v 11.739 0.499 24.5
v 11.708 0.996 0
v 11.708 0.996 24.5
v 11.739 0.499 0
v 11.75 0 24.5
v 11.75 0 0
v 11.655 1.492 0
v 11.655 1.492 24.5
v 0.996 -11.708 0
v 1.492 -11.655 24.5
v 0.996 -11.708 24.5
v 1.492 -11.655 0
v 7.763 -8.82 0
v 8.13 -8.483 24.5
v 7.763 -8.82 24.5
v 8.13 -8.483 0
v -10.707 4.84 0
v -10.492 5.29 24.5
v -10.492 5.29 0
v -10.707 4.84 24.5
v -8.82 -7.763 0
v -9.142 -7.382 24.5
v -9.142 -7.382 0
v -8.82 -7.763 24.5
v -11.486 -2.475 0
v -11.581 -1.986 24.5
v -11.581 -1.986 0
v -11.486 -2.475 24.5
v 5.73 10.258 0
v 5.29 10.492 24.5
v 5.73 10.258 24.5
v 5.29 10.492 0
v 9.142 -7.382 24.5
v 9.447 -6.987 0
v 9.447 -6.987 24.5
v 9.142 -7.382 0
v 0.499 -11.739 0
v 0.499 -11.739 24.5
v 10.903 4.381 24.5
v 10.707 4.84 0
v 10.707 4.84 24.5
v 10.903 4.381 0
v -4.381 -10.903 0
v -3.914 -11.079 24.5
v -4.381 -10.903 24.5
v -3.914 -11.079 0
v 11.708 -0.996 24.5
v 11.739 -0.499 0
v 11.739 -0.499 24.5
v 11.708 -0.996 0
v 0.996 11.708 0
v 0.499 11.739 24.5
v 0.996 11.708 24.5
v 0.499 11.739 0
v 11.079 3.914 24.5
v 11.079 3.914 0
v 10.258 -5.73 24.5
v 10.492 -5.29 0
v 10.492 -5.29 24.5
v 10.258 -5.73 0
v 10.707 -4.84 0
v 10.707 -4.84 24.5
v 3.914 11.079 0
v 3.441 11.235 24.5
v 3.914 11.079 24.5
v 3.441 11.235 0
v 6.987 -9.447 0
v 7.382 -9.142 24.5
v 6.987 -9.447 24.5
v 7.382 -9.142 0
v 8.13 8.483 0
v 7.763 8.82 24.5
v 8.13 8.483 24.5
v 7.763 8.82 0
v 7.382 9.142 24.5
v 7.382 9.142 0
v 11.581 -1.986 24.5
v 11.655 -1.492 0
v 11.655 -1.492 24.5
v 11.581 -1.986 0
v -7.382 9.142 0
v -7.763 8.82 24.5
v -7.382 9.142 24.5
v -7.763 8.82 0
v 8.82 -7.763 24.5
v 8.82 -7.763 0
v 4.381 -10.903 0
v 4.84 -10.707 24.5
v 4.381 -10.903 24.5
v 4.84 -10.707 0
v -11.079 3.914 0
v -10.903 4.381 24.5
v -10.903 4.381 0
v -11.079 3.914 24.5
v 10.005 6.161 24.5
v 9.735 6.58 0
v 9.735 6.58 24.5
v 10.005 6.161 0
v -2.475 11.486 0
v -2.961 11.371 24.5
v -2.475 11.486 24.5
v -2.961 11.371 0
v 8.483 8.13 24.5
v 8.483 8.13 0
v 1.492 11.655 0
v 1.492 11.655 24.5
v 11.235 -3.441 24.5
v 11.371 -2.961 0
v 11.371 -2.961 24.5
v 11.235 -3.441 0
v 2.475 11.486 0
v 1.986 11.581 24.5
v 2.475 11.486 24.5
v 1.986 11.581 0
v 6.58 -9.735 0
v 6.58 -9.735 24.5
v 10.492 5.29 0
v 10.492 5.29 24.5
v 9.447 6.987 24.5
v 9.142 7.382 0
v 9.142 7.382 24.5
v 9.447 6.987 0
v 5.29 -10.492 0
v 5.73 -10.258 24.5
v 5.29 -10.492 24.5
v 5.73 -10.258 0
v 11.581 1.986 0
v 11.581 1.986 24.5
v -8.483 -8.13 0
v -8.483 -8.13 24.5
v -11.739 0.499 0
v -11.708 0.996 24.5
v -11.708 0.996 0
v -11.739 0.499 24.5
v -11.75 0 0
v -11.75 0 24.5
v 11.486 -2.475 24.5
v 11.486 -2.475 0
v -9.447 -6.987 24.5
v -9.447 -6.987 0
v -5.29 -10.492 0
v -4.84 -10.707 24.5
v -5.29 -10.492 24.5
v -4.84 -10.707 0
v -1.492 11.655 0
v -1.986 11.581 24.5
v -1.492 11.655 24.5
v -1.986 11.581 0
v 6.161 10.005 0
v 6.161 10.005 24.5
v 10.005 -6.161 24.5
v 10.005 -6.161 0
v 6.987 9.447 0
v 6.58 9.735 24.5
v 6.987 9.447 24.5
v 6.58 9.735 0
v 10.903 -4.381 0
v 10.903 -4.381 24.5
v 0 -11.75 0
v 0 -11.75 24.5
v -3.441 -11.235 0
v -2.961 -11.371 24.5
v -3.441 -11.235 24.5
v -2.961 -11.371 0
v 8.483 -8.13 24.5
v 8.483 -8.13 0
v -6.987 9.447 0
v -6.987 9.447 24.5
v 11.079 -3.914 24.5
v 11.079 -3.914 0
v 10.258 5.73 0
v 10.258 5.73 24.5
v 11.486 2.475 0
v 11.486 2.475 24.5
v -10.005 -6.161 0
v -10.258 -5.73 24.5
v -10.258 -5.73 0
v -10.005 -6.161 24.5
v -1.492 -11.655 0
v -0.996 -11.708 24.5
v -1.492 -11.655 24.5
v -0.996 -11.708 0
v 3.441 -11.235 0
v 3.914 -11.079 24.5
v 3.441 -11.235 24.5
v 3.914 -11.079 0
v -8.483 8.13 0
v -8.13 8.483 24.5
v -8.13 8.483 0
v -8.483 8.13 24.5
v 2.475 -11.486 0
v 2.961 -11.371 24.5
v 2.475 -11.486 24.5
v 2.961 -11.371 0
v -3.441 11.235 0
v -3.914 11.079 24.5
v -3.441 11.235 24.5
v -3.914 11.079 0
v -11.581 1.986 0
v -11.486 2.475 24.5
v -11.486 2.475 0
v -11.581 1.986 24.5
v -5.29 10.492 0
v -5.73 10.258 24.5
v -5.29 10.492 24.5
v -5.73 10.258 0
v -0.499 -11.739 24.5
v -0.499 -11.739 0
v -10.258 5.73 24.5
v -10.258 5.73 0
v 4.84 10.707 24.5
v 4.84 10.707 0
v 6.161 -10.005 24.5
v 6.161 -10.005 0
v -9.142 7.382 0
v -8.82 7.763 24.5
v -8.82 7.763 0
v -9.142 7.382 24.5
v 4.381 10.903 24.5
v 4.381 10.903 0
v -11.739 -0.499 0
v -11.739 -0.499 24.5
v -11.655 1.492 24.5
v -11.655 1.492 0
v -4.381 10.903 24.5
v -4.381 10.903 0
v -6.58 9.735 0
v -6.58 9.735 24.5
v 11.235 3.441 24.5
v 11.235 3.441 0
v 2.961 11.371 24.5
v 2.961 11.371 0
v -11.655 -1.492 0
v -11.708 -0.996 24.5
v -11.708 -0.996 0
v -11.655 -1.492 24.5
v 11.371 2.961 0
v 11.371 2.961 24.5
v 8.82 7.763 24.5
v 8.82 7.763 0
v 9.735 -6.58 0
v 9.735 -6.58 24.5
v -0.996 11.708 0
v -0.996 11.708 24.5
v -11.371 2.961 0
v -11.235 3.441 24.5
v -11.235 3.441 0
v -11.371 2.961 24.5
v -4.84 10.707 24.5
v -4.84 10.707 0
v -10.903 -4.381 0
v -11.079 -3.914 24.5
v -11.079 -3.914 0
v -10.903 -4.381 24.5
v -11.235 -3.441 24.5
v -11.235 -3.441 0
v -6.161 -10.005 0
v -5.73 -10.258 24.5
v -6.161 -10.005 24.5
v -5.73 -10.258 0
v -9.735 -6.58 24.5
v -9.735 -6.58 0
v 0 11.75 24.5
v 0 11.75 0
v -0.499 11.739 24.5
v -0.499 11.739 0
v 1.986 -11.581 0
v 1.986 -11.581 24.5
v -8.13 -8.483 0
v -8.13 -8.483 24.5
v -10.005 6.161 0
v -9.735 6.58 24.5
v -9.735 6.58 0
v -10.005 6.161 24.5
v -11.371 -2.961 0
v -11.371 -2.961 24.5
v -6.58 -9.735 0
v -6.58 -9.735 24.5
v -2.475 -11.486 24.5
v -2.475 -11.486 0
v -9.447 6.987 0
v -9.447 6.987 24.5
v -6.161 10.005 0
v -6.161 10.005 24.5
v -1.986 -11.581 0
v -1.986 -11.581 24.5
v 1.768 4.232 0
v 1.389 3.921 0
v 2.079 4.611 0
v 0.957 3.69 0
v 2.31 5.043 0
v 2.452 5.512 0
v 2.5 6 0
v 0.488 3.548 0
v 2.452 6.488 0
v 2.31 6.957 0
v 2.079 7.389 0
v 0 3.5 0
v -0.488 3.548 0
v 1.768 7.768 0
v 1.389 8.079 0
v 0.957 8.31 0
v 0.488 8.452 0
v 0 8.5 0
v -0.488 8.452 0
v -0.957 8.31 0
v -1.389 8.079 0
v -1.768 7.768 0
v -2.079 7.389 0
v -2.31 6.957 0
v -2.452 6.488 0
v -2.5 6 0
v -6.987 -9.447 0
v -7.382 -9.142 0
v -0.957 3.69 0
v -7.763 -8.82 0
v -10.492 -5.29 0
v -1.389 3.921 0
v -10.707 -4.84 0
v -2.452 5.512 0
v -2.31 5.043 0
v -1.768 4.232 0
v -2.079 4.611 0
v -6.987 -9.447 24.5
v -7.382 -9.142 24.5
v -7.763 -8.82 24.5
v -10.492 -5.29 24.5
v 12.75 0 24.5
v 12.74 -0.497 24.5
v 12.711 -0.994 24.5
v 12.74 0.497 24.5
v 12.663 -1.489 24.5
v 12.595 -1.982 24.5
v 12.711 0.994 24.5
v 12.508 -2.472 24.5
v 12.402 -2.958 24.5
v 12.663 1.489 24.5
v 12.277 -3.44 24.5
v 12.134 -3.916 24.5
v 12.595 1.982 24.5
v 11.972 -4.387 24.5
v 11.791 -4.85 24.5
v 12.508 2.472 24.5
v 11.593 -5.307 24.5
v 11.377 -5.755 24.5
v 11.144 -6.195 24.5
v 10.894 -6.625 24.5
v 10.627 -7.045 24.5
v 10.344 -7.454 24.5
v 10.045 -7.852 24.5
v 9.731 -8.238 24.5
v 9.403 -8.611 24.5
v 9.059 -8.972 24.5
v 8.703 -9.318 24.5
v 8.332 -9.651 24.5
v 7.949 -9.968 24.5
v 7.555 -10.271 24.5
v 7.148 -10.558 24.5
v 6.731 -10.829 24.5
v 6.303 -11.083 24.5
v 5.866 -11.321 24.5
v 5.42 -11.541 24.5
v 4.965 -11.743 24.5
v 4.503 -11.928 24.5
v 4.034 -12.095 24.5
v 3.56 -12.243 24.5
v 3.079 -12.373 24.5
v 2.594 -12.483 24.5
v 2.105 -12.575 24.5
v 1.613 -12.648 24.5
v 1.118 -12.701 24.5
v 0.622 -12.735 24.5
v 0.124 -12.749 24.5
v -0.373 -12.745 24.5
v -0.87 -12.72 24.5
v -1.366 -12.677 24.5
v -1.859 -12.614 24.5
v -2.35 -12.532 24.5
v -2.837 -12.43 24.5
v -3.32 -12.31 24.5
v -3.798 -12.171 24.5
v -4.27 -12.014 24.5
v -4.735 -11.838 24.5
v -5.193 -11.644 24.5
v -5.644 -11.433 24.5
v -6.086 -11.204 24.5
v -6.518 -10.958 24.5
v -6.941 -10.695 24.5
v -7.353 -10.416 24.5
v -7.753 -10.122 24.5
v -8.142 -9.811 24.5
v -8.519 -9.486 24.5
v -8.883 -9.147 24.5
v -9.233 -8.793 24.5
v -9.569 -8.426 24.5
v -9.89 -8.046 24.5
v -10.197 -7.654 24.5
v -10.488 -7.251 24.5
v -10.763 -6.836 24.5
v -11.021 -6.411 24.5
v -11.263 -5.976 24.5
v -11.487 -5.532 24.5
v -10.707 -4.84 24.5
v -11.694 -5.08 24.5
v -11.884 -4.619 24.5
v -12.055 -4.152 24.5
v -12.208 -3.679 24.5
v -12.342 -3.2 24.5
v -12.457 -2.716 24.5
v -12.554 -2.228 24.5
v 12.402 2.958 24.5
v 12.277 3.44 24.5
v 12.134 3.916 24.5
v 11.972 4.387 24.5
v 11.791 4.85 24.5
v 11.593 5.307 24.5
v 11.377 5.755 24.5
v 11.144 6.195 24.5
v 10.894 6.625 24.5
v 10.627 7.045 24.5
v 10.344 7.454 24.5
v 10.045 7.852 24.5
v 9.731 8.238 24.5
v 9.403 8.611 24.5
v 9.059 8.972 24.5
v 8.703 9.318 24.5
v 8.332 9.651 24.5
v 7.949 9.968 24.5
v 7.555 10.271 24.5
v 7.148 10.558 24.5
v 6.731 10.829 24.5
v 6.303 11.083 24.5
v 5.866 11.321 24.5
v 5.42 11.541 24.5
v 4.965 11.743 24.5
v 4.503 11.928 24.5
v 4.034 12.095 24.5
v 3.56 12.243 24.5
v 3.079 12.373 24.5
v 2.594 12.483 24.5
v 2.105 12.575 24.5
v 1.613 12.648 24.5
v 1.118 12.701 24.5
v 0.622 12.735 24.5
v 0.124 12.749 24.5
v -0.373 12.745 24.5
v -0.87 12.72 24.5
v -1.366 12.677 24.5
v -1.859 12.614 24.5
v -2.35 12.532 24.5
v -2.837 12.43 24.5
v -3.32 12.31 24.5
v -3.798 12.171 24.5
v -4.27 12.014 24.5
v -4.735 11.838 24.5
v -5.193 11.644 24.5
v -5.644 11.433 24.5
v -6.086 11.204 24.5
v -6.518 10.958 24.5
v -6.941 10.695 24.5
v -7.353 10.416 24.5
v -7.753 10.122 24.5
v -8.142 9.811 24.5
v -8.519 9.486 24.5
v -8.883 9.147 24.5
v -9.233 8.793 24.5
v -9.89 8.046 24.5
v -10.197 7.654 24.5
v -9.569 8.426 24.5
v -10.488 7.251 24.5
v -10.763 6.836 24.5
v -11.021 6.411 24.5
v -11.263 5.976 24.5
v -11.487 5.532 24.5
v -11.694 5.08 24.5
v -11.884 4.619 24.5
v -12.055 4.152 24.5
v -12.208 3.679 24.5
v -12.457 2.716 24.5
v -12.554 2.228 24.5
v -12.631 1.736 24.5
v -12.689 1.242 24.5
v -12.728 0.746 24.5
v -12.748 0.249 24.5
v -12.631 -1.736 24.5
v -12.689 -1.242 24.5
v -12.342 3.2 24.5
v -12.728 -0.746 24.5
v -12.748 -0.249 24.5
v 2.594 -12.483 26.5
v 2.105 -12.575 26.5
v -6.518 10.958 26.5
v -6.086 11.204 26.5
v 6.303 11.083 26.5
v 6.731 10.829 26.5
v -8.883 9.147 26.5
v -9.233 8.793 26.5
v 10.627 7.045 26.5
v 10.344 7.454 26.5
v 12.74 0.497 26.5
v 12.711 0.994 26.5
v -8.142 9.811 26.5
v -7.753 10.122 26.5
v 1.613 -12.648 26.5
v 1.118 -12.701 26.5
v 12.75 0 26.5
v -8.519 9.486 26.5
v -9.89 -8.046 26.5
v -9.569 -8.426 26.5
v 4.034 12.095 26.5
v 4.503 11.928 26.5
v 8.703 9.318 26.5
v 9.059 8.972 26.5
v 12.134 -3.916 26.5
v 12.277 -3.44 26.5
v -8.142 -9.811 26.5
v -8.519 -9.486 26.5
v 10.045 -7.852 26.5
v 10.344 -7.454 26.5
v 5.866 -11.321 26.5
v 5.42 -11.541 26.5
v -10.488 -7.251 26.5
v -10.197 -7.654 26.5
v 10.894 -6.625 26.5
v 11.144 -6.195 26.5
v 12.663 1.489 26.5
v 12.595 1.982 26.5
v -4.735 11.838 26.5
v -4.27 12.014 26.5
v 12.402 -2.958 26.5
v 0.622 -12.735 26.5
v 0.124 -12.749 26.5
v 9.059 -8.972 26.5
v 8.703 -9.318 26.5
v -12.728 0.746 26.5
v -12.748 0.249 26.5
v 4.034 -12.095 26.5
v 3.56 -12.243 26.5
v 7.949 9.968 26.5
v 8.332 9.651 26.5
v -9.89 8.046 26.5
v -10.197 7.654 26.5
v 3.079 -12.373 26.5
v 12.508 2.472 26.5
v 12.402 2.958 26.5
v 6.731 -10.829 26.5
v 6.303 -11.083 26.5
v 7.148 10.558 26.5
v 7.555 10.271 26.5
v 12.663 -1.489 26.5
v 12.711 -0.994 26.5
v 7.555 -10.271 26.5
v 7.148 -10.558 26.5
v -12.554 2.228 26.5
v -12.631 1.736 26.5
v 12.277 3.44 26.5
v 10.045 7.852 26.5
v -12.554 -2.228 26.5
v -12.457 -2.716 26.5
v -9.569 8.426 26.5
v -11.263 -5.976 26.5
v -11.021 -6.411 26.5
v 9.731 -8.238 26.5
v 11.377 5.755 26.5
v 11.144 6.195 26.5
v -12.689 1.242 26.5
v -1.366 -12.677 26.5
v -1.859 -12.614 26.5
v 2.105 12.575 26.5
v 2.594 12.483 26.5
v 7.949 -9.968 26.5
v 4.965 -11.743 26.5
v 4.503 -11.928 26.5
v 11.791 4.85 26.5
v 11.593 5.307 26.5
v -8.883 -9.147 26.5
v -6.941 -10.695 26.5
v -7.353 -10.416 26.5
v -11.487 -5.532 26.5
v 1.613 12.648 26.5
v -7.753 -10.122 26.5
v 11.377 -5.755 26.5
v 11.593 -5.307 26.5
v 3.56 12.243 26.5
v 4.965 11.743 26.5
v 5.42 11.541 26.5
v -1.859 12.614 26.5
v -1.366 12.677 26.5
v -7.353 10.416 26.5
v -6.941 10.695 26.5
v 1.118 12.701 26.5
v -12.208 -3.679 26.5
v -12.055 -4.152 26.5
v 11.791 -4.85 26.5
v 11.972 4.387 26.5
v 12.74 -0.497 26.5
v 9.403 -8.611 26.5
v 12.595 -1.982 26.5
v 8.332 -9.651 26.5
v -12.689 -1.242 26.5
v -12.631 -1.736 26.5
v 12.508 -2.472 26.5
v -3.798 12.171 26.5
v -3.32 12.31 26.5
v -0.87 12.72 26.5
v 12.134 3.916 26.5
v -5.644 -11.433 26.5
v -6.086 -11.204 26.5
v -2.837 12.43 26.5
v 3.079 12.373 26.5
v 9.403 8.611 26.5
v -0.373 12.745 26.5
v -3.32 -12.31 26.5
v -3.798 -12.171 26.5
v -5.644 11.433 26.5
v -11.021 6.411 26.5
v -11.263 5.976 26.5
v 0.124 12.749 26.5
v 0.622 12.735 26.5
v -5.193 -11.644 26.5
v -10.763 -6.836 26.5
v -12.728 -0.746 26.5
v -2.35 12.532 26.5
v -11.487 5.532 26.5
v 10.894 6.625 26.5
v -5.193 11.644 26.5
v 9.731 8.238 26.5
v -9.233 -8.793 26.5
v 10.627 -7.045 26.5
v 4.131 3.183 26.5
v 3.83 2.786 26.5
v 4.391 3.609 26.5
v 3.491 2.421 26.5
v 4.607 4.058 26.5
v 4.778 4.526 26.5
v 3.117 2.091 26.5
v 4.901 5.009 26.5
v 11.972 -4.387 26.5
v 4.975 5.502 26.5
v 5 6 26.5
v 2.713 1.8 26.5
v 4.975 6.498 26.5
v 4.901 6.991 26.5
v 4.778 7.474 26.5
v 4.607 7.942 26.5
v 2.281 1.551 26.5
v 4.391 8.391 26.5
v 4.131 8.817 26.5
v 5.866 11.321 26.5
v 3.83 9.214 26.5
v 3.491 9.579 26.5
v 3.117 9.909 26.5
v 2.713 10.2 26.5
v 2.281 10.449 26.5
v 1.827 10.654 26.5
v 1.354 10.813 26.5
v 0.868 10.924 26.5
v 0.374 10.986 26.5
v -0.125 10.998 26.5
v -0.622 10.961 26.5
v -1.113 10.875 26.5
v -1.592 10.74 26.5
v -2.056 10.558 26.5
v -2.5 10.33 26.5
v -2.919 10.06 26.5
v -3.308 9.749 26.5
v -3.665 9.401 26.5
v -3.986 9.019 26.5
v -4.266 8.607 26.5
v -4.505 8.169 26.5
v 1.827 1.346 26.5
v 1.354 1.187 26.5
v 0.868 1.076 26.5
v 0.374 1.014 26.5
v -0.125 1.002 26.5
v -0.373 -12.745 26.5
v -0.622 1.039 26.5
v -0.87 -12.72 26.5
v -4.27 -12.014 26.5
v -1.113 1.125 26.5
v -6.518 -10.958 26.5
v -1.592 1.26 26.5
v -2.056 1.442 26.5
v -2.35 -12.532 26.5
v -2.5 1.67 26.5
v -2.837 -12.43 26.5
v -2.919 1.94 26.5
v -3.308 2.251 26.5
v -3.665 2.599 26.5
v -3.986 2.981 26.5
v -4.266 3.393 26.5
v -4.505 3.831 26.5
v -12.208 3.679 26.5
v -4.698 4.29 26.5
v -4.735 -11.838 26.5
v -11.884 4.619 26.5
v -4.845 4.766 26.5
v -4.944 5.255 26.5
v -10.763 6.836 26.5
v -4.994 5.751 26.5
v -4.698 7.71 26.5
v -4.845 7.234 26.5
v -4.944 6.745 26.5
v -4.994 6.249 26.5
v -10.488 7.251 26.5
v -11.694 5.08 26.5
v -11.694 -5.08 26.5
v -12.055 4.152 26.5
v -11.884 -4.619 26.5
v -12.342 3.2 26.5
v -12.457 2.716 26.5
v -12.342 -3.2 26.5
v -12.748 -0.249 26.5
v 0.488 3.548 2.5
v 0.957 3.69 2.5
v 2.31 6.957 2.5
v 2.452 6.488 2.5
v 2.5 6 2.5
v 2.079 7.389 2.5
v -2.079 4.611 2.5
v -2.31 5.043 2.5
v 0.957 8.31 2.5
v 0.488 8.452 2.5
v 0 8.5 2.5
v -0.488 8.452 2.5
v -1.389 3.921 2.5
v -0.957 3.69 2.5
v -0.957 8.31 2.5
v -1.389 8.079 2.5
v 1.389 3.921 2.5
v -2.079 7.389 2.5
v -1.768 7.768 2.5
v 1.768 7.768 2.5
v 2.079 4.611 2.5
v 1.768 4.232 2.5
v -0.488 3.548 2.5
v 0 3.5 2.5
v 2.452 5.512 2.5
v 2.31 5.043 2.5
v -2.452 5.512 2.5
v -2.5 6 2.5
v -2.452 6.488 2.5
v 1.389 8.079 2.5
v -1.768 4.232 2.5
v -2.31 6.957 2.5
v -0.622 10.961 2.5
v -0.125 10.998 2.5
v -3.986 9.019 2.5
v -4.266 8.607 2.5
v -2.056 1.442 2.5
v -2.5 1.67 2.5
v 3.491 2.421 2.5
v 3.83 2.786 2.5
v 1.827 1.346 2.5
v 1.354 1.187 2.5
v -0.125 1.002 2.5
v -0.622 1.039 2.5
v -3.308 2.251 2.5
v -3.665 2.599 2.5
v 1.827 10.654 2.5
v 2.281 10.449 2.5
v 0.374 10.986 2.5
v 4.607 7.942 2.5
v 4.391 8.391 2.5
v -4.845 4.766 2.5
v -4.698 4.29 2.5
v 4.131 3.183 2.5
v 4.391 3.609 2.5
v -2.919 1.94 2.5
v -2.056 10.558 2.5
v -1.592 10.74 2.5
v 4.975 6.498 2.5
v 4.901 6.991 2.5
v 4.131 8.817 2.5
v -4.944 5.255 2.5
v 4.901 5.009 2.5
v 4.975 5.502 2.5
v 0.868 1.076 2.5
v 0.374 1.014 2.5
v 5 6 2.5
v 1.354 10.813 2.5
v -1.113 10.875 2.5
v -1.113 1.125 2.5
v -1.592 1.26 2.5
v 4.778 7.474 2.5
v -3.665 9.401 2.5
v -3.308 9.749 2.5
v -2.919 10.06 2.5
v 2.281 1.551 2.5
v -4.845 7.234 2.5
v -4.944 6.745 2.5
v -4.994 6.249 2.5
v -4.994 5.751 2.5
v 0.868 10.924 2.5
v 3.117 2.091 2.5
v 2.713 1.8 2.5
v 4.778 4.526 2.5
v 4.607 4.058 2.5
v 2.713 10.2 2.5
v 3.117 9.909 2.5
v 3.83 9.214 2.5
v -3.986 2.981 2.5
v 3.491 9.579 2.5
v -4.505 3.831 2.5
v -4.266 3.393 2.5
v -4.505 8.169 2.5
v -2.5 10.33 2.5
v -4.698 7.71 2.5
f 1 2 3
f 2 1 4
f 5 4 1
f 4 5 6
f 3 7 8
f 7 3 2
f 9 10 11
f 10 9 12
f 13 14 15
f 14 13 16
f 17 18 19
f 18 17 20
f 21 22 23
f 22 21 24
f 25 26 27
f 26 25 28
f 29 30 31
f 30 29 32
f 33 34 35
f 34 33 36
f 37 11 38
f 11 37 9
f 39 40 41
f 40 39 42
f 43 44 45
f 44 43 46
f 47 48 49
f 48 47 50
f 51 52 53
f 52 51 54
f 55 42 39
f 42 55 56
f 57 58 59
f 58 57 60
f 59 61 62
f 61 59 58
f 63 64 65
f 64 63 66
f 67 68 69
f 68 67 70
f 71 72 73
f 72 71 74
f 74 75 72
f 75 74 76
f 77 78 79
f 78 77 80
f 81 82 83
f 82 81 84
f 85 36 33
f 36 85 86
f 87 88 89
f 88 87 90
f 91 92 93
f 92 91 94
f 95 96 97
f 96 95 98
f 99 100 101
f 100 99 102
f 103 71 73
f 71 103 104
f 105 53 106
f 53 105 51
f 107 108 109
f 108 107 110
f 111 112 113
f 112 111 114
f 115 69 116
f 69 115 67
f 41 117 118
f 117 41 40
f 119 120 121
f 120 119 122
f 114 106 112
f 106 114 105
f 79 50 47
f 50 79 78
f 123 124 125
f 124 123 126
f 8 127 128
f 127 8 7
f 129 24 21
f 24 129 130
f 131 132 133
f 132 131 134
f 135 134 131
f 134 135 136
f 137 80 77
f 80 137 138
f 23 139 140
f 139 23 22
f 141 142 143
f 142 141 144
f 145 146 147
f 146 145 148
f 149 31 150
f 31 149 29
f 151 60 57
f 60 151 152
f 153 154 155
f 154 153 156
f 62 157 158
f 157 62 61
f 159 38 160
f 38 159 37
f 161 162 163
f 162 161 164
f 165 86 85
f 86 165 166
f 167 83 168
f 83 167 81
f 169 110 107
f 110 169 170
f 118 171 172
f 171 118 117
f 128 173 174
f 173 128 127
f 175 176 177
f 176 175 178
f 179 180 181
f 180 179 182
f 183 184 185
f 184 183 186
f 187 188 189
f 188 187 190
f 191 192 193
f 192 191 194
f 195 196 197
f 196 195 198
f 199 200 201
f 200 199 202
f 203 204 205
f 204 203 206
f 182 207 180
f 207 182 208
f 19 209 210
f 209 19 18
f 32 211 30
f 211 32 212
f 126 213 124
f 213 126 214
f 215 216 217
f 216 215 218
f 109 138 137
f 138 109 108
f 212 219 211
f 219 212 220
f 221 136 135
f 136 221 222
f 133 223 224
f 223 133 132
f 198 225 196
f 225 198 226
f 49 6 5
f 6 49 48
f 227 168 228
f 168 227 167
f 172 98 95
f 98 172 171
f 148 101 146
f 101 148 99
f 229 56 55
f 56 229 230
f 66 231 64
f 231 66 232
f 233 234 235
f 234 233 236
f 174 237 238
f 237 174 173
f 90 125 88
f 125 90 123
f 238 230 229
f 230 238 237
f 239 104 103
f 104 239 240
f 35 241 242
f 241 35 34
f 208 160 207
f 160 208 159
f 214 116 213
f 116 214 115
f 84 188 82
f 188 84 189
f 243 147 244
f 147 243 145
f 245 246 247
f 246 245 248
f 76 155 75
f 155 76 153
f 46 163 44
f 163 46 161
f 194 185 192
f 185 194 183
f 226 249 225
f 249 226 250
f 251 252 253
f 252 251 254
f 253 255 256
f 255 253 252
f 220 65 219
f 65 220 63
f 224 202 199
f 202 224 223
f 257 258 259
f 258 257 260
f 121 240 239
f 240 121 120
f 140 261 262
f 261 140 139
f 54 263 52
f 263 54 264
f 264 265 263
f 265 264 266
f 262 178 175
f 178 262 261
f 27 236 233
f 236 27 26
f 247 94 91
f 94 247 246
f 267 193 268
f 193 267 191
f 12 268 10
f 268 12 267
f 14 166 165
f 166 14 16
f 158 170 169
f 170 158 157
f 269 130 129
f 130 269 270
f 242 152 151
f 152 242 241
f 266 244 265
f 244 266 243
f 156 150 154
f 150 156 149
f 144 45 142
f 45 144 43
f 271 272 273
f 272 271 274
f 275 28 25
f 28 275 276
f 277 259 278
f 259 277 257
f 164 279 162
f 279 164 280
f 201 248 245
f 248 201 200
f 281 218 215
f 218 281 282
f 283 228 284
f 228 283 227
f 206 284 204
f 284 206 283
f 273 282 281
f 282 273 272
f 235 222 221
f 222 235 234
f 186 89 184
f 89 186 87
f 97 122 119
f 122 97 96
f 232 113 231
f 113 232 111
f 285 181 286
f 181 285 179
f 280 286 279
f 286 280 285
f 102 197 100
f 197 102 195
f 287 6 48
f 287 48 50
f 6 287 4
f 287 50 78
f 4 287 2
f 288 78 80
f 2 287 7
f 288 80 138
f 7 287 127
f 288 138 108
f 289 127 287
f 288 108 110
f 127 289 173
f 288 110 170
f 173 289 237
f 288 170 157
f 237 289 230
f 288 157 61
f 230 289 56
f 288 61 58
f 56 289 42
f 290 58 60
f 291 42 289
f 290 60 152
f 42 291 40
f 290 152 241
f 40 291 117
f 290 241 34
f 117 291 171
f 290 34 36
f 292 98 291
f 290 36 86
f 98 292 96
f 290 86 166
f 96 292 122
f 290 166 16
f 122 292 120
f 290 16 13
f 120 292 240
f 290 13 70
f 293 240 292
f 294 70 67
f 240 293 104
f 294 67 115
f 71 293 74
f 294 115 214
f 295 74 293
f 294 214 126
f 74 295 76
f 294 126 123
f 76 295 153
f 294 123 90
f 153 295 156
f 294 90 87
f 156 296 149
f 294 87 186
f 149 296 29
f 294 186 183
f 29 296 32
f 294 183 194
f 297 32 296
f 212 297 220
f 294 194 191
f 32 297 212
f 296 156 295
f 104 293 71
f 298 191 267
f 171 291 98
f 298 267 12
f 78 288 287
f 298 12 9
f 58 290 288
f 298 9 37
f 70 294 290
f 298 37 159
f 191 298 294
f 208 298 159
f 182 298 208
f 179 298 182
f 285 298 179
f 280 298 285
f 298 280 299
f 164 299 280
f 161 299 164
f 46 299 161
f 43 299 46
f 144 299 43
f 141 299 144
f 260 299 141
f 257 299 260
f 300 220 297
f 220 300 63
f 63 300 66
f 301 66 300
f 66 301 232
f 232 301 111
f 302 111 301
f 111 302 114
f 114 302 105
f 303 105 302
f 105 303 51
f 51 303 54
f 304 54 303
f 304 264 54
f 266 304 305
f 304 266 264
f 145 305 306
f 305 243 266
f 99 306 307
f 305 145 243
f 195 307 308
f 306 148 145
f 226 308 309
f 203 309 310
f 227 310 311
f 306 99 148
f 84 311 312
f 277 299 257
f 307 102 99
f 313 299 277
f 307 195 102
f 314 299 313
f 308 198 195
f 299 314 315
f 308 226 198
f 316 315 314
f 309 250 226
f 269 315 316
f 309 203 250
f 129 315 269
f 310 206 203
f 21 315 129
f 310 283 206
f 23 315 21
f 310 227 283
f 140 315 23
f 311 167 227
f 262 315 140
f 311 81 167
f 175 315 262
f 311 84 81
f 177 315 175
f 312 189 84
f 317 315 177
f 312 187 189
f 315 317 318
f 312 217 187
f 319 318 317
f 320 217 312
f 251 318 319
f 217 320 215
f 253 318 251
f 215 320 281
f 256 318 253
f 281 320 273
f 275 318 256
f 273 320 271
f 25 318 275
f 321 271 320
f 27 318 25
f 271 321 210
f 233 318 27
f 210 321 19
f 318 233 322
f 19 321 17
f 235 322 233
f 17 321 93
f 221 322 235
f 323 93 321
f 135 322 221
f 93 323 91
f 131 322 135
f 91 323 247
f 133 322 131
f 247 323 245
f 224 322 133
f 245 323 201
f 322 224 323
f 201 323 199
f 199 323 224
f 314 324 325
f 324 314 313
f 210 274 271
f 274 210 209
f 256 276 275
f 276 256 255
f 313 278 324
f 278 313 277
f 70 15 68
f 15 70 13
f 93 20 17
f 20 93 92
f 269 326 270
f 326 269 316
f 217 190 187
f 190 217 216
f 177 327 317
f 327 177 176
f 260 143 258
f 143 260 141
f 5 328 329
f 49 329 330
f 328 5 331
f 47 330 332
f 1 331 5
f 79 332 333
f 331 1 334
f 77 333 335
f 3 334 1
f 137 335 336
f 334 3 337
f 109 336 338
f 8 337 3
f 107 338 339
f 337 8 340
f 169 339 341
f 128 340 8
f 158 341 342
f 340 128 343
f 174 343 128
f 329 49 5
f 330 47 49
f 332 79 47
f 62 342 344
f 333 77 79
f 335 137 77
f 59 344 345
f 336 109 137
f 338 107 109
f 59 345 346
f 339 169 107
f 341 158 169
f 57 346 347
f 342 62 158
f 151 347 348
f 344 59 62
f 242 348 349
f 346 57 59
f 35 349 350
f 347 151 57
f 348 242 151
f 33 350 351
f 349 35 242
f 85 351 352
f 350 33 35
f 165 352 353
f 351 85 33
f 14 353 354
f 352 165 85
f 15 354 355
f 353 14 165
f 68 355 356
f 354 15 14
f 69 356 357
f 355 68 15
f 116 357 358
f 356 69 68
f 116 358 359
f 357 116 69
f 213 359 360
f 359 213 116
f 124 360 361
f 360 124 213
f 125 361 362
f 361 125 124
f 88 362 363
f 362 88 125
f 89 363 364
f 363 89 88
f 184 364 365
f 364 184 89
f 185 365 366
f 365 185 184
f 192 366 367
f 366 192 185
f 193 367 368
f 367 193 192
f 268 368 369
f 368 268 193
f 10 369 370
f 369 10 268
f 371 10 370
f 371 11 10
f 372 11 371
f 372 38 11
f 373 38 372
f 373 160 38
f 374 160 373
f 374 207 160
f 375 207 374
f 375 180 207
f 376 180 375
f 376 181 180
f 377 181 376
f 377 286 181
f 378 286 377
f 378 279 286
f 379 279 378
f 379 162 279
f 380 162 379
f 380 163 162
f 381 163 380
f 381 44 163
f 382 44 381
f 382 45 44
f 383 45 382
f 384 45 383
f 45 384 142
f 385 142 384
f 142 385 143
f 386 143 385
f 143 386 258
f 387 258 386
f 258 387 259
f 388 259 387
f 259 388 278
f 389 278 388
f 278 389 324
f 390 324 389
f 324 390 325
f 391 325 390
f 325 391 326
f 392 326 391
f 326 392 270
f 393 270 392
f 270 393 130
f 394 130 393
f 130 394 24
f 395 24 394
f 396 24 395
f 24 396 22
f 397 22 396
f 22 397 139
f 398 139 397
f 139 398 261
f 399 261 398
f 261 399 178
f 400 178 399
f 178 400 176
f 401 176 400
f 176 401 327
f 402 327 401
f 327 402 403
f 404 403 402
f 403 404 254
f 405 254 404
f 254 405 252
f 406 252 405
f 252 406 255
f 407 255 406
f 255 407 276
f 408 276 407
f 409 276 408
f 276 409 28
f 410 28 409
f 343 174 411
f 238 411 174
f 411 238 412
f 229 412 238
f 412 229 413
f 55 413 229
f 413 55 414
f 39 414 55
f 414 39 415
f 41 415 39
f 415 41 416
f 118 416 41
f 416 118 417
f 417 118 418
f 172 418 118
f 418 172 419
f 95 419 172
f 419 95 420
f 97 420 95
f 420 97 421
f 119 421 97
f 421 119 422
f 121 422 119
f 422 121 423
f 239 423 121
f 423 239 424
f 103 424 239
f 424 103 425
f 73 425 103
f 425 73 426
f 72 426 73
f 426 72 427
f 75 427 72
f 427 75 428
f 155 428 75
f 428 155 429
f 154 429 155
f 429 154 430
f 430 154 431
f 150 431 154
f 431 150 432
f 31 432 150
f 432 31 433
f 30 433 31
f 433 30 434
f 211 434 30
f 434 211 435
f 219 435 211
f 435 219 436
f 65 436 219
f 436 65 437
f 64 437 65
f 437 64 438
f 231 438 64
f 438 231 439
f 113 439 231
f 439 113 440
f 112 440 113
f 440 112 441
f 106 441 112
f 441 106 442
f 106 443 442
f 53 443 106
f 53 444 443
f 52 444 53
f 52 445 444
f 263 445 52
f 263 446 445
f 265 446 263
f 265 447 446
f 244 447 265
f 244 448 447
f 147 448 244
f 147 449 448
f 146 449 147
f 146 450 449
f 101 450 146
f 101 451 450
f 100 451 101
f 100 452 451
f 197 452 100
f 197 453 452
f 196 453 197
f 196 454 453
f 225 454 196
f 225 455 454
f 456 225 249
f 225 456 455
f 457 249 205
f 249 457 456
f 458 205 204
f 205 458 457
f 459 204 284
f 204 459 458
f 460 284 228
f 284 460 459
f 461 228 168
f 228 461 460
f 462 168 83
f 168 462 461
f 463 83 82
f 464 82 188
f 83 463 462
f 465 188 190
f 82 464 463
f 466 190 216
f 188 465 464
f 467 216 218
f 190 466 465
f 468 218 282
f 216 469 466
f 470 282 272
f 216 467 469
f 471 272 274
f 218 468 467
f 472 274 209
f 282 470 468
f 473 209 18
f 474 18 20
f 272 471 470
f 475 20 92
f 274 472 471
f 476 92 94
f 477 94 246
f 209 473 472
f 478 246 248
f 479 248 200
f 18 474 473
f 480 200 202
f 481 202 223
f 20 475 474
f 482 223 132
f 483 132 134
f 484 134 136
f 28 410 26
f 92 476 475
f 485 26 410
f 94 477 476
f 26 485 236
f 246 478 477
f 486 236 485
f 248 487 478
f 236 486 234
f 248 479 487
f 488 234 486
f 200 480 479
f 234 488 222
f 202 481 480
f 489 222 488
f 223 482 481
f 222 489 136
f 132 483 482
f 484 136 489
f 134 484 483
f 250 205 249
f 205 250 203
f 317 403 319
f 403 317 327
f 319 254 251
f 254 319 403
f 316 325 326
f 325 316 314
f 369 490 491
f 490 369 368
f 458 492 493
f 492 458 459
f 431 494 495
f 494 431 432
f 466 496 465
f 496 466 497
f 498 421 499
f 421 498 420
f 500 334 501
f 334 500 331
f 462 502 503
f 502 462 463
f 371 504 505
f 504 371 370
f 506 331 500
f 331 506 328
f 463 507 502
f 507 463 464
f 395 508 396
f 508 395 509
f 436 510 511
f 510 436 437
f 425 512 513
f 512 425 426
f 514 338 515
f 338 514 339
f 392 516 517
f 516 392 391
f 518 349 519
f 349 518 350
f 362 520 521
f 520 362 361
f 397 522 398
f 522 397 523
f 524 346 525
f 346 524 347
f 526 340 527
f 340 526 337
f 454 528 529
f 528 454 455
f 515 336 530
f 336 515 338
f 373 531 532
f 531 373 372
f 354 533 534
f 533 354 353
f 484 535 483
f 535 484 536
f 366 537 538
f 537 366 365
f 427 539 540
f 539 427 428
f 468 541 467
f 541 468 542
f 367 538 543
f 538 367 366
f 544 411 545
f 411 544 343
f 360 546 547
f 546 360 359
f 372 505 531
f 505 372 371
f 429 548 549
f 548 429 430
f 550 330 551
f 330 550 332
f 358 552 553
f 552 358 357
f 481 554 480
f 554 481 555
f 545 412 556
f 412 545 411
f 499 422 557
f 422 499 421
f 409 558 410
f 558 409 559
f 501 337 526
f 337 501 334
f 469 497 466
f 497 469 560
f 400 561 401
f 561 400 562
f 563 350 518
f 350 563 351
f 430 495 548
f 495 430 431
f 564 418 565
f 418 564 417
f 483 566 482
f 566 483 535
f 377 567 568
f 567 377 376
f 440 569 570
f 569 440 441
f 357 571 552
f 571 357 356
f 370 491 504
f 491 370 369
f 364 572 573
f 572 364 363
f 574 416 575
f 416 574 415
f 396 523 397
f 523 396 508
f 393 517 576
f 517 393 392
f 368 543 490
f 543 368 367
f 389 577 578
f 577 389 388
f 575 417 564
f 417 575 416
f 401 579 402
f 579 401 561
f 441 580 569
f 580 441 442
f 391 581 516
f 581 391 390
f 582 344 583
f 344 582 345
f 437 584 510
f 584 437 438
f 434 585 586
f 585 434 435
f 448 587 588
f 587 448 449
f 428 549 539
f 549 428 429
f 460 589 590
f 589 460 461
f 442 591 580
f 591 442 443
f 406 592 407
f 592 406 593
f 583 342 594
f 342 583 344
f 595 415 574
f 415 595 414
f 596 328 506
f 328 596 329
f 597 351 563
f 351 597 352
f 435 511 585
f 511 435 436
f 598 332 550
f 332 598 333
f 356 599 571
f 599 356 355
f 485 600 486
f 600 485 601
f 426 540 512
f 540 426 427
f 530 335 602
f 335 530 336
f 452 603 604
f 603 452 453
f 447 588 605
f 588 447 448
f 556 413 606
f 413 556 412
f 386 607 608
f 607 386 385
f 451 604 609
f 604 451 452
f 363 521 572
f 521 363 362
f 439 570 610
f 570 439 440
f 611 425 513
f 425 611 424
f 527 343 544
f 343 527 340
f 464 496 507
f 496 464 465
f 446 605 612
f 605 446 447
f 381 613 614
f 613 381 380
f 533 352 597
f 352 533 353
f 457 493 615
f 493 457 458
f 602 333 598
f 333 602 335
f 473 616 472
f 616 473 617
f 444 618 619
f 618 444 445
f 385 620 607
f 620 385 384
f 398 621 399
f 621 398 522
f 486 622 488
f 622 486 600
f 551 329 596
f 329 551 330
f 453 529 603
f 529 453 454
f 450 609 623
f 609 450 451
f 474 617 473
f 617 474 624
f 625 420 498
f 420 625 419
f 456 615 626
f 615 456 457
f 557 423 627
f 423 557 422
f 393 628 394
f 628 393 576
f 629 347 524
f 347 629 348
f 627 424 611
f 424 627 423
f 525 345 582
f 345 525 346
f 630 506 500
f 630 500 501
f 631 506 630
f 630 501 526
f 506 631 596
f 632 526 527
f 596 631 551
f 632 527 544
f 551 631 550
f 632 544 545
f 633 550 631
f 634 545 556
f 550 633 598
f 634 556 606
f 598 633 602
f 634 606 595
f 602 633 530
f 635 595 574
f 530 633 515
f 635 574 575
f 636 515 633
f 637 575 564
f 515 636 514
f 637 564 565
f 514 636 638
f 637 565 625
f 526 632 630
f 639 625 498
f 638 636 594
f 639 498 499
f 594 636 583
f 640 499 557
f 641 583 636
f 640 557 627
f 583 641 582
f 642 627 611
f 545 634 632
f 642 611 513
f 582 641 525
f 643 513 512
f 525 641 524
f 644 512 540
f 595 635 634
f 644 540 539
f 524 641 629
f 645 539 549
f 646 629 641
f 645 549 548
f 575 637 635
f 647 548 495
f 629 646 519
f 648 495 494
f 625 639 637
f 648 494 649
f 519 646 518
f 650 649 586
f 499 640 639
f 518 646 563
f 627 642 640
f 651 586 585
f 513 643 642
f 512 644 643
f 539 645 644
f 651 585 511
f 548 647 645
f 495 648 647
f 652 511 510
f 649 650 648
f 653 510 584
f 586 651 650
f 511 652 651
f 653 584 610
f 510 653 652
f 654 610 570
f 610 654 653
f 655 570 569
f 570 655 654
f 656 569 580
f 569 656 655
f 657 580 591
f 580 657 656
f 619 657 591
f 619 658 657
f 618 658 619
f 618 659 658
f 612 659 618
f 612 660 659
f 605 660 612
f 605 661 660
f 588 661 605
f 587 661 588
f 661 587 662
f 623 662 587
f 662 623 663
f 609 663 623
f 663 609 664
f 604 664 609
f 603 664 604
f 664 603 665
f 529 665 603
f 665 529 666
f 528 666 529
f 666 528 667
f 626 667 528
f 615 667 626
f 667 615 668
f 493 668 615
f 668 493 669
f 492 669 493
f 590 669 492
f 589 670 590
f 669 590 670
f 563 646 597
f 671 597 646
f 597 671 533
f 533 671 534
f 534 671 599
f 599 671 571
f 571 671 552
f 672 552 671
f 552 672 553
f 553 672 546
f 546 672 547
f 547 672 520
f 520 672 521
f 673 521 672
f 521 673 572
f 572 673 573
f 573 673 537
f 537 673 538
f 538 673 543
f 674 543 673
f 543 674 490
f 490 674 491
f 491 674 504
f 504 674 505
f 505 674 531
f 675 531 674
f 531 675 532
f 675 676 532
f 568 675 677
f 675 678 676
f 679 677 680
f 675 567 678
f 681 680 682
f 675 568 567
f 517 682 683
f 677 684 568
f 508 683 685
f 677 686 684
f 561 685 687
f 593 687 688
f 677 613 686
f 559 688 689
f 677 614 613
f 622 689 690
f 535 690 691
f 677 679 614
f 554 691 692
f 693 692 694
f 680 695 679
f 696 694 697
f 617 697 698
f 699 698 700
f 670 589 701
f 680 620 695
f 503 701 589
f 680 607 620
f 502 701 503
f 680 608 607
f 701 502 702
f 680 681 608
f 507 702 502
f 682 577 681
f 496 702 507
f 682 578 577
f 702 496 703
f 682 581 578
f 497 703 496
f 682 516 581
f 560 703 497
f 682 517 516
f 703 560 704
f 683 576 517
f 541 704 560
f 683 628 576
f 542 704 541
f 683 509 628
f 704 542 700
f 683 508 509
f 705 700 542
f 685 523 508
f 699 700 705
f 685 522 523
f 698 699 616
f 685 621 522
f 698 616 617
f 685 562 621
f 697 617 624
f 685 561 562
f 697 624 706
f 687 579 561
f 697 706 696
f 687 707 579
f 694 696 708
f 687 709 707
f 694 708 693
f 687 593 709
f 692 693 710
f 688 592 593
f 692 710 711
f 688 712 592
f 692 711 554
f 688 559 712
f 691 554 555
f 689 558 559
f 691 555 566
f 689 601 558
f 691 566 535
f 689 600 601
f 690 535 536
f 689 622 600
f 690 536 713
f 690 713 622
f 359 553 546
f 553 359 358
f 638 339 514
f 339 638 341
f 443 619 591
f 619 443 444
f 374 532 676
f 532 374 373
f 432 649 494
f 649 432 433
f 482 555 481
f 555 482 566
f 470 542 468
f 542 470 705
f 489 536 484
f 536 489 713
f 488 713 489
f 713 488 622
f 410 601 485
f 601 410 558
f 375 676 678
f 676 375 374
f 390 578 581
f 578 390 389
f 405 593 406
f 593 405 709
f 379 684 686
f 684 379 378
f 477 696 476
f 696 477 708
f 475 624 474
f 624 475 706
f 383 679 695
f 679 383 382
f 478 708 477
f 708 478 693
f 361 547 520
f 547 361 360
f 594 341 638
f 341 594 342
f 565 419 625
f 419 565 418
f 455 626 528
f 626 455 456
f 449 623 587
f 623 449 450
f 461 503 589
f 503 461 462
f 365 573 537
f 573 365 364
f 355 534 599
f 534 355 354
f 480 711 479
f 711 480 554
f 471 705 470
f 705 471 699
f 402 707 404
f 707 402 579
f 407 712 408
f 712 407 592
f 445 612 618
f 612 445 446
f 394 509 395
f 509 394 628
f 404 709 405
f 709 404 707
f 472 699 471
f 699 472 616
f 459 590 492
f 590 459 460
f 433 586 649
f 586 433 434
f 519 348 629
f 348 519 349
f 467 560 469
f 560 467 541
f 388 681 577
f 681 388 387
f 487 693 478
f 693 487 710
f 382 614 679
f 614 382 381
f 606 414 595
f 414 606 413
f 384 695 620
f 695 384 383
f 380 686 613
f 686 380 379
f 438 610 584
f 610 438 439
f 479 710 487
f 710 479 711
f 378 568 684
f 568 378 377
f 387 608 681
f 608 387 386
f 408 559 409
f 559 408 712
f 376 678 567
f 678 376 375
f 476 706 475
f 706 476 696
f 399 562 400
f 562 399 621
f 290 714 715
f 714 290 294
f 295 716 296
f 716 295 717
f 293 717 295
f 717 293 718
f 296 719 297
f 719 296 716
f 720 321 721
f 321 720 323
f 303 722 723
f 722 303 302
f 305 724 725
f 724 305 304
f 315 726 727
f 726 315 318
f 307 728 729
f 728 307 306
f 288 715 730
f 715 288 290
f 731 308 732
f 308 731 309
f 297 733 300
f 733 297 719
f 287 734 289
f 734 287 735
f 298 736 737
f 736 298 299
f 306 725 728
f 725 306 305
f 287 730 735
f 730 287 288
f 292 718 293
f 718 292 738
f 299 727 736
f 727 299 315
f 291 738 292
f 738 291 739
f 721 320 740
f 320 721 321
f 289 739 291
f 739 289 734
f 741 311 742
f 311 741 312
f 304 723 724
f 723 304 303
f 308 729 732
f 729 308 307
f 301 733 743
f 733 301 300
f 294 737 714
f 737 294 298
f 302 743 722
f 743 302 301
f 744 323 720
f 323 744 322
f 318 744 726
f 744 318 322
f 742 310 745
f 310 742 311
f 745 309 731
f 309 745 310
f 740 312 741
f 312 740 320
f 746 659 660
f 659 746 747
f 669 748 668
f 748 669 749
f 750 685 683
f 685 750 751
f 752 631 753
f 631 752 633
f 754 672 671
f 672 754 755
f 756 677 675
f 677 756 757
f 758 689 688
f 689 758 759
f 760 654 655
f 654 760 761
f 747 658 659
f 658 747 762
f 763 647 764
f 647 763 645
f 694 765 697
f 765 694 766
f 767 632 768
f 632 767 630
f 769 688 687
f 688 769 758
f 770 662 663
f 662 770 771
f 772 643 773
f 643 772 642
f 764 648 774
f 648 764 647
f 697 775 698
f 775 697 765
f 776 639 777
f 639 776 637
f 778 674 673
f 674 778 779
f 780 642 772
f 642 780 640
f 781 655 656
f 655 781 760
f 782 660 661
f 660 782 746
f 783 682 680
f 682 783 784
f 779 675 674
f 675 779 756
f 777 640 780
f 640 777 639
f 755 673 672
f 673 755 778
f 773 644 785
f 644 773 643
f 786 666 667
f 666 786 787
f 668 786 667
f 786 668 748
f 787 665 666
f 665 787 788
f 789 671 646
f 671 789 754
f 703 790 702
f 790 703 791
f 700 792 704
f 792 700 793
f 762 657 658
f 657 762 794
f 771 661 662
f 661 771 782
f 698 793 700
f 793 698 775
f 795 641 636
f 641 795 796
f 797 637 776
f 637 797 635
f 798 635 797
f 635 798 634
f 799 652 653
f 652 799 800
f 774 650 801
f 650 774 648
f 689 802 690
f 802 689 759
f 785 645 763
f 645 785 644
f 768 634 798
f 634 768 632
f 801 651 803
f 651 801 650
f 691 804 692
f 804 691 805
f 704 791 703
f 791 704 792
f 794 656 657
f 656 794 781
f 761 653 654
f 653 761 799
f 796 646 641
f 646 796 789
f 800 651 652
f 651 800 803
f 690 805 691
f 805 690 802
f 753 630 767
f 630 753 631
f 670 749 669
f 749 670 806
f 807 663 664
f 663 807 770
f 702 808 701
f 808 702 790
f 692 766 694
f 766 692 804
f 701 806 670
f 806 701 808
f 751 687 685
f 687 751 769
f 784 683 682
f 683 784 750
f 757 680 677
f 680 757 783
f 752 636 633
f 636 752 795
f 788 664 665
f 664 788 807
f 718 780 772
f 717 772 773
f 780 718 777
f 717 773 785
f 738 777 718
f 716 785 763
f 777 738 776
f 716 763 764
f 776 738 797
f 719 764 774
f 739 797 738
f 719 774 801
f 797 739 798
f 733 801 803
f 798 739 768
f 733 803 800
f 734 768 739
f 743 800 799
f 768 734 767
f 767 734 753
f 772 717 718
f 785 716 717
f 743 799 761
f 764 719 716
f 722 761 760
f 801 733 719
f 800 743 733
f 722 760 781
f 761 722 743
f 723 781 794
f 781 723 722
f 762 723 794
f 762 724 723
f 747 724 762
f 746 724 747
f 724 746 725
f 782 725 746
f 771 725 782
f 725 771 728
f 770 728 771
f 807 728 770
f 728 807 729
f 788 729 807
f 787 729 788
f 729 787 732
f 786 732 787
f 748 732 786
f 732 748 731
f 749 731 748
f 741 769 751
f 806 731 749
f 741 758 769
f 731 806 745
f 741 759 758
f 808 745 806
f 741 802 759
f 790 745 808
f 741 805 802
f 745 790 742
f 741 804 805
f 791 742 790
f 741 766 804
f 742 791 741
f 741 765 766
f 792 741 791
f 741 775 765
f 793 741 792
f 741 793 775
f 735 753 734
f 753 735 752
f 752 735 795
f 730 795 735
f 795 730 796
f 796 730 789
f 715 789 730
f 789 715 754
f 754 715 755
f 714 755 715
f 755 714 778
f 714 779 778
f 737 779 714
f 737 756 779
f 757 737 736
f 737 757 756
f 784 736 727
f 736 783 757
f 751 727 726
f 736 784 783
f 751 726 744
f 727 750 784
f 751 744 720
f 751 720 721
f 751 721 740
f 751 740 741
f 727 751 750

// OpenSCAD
$fa=0.5; // default minimum facet angle is now 0.5
$fs=0.5; // default minimum facet size is now 0.5 mm

support_diameter = 23.5;
support_width = 24.5;

outside_pad = 2;
pad_width = 2;

hole_diameter = 5;
hole_offset = 6;

hole_outer_diameter = 10;

difference() {
    union() {
        cylinder(d = support_diameter, h = support_width);
        translate([0,0,support_width]) cylinder(d = support_diameter + outside_pad, h = pad_width);
    }
    translate([0,hole_offset,-1]) cylinder(d = hole_diameter, h = 2 + support_width + pad_width);
    translate([0,hole_offset,2.5]) cylinder(d = hole_outer_diameter, h = 2 + support_width + pad_width);
}
